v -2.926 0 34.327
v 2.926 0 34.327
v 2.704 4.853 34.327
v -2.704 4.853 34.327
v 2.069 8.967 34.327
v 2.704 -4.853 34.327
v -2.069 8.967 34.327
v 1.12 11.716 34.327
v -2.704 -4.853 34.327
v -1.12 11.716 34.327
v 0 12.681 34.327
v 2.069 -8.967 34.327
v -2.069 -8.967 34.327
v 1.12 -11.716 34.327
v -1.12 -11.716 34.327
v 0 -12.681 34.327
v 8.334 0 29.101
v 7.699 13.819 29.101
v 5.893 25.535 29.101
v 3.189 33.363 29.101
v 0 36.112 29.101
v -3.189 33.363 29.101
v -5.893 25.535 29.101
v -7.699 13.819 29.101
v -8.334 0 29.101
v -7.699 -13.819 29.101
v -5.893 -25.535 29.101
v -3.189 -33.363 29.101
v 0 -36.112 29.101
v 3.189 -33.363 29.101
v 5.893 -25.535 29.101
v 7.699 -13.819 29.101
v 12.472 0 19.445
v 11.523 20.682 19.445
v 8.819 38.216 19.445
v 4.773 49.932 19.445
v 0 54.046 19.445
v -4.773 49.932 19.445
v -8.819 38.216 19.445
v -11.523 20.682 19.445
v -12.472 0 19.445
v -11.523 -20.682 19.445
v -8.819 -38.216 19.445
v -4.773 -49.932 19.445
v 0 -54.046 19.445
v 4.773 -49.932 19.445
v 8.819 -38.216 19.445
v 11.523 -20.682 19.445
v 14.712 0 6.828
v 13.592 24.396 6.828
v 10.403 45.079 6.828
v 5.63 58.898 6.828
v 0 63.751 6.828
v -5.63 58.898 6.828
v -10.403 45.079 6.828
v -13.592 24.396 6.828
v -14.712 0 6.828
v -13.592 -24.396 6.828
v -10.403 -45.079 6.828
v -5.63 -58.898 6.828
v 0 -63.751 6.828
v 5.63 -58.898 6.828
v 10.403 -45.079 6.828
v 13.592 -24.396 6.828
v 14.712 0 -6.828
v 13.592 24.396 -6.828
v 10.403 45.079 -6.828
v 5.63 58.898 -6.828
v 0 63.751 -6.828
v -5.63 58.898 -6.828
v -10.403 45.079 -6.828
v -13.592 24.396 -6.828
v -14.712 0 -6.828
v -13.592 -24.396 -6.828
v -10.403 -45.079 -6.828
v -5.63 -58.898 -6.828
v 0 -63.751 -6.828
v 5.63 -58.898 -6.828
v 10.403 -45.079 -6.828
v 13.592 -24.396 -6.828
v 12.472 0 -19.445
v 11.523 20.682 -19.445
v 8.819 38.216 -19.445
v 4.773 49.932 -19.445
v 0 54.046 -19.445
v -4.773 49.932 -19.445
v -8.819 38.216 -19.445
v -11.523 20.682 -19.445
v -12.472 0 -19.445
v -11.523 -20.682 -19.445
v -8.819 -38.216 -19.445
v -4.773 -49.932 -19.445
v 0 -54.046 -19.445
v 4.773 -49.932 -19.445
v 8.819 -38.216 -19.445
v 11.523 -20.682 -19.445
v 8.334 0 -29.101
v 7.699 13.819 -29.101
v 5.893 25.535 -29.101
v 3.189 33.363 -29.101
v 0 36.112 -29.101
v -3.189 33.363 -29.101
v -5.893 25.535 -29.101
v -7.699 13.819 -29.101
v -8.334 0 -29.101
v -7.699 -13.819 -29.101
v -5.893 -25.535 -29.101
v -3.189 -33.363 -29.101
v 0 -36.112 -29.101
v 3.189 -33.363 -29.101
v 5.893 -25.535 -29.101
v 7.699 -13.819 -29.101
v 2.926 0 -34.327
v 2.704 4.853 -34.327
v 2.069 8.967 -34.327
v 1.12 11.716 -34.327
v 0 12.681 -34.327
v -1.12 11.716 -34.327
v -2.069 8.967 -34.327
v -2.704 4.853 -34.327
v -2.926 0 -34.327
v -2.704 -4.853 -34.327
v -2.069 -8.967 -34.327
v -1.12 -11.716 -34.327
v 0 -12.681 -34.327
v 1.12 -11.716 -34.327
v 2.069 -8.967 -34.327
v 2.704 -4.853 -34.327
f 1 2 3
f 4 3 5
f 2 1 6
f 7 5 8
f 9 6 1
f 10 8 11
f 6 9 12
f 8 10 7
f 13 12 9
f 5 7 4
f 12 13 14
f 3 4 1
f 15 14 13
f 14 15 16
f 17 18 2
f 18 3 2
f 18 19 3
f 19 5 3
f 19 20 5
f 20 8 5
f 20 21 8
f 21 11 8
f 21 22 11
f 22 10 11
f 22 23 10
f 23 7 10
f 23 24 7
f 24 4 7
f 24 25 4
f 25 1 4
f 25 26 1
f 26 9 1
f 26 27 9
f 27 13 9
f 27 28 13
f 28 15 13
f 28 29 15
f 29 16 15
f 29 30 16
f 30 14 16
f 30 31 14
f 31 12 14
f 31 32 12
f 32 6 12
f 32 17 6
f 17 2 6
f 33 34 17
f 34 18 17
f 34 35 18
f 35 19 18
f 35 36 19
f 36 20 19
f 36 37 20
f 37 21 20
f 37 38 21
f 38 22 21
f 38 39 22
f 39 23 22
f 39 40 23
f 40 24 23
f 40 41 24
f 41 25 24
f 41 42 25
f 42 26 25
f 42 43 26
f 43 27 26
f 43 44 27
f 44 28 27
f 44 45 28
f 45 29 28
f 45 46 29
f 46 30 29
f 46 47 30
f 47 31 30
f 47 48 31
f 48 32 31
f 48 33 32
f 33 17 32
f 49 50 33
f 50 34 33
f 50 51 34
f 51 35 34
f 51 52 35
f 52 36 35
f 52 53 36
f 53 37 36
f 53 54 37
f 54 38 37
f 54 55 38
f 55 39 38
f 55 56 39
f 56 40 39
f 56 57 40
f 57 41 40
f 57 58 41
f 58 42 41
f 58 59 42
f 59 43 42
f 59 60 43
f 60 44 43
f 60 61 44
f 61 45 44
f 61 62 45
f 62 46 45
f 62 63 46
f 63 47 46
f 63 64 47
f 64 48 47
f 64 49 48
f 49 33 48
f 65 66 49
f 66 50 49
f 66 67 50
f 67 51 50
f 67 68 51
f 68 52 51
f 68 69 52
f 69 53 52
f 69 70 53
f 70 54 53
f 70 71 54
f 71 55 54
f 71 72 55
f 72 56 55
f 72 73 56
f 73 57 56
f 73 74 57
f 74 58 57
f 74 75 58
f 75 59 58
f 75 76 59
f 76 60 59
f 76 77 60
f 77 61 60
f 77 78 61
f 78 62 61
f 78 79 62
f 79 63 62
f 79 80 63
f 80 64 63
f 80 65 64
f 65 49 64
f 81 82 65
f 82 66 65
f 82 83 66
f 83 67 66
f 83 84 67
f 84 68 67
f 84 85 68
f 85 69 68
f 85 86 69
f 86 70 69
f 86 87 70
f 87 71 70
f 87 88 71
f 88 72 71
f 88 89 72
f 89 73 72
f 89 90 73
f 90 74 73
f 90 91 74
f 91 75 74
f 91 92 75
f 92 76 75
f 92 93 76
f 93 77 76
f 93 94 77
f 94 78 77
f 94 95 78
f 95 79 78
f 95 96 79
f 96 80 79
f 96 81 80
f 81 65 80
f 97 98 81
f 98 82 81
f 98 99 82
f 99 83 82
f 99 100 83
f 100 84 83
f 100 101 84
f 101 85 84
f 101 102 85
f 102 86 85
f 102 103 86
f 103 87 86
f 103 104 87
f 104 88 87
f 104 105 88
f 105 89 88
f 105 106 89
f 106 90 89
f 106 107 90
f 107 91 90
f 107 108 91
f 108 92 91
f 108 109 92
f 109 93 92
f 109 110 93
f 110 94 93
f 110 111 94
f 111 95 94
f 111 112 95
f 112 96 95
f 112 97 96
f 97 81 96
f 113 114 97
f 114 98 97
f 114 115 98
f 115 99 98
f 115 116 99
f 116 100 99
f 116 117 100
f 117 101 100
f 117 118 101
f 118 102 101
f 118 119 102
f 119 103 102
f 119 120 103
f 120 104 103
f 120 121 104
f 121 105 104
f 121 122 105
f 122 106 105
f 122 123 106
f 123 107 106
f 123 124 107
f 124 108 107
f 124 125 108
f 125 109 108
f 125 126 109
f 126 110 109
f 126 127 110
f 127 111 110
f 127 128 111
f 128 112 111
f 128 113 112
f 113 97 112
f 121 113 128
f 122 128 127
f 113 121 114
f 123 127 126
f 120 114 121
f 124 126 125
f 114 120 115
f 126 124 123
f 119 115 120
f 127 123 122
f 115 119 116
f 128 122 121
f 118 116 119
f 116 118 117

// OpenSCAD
// Generated by SolidPython 1.0.1 on 2020-07-29 00:46:45


scale(v = [3, 13, 7]) {
	sphere(r = 5);
}
/***********************************************
*********      SolidPython code:      **********
************************************************
 
# import packages: SolidPython
from solid import *
from solid.utils import *
from itertools import chain, combinations, permutations


class Resize:

    def __init__(self, scad_file):
        self.scad_file = scad_file
        #self.scad_file = import_scad(scad_file)
        # cone/cylinder param:
        self.r1 = 0
        self.r2 = 0
        self.h = 0
        # rectangular prism param:
        self.w = 0
        self.l = 0
        # ellipse param:
        self.r = 0

    # import OpenScad code (file name corresponds to shape)


    # classify shape + parameters
    def assign(self, param1, param2, param3):
        if self.scad_file == 'cone.scad':
            self.r1 = param1
            self.r2 = param2
            self.h = param3
        elif self.scad_file == 'cylinder.scad':
            self.r1 = param1
            self.r2 = param2
            self.h = param3
        elif self.scad_file == 'rectangularPrism.scad':
            self.h = param1
            self.l = param2
            self.w = param3
        else:
            self.r = param1
            self.h = param2

    # resize parameters
    def iterate(self):
        x = range(3, 20, 2)
        i = 1
        if self.scad_file == 'cone.scad':
            tempList = list(permutations(x, 2))
            for temp in tempList:
                param1 = temp[0]
                param2 = temp[1]
                filepath = 'produced_scad_files/' + 'cone' + str(param1) + '_' + str(param2) + '_' + '.scad'
                scad_render_to_file(cylinder(h=param1, r1=param2, r2=0), filepath)

        elif self.scad_file == 'cylinder.scad':
            tempList = list(permutations(x, 3))
            for temp in tempList:
                param1 = temp[0]
                param2 = temp[1]
                filepath = 'produced_scad_files/' + 'cylinder' + str(param1) + '_' + str(param2) + '_' + '.scad'
                scad_render_to_file(cylinder(h=param1, r1=param2, r2=param2), filepath)

        elif self.scad_file == 'rectangularPrism.scad':
            tempList = list(permutations(x, 3))
            for temp in tempList:
                param1 = temp[0]
                param2 = temp[1]
                param3 = temp[2]
                filepath = 'produced_scad_files/' + 'rectangularPrism' + str(param1) + '_' + str(param2) + '_' + str(
                    param3) + '.scad'
                scad_render_to_file(cube(size=(param1, param2, param3)), filepath)

        elif self.scad_file == 'ellipse.scad':
            tempList = list(permutations(x, 4))
            for temp in tempList:
                param1 = temp[0]
                param2 = temp[1]
                param3 = temp[2]
                param4 = temp[3]
                filepath = 'produced_scad_files/' + 'ellipse' + str(param1) + '_' + str(param2) + '_' + str(param3) + '_' + str(param4) + '.scad'
                scad_render_to_file(scale([param1, param2, param3])(sphere(r=param4)), filepath)

    def render_to_scadfile(self):
        scad_render_to_file(scad, 'example.scad') 
 
************************************************/
